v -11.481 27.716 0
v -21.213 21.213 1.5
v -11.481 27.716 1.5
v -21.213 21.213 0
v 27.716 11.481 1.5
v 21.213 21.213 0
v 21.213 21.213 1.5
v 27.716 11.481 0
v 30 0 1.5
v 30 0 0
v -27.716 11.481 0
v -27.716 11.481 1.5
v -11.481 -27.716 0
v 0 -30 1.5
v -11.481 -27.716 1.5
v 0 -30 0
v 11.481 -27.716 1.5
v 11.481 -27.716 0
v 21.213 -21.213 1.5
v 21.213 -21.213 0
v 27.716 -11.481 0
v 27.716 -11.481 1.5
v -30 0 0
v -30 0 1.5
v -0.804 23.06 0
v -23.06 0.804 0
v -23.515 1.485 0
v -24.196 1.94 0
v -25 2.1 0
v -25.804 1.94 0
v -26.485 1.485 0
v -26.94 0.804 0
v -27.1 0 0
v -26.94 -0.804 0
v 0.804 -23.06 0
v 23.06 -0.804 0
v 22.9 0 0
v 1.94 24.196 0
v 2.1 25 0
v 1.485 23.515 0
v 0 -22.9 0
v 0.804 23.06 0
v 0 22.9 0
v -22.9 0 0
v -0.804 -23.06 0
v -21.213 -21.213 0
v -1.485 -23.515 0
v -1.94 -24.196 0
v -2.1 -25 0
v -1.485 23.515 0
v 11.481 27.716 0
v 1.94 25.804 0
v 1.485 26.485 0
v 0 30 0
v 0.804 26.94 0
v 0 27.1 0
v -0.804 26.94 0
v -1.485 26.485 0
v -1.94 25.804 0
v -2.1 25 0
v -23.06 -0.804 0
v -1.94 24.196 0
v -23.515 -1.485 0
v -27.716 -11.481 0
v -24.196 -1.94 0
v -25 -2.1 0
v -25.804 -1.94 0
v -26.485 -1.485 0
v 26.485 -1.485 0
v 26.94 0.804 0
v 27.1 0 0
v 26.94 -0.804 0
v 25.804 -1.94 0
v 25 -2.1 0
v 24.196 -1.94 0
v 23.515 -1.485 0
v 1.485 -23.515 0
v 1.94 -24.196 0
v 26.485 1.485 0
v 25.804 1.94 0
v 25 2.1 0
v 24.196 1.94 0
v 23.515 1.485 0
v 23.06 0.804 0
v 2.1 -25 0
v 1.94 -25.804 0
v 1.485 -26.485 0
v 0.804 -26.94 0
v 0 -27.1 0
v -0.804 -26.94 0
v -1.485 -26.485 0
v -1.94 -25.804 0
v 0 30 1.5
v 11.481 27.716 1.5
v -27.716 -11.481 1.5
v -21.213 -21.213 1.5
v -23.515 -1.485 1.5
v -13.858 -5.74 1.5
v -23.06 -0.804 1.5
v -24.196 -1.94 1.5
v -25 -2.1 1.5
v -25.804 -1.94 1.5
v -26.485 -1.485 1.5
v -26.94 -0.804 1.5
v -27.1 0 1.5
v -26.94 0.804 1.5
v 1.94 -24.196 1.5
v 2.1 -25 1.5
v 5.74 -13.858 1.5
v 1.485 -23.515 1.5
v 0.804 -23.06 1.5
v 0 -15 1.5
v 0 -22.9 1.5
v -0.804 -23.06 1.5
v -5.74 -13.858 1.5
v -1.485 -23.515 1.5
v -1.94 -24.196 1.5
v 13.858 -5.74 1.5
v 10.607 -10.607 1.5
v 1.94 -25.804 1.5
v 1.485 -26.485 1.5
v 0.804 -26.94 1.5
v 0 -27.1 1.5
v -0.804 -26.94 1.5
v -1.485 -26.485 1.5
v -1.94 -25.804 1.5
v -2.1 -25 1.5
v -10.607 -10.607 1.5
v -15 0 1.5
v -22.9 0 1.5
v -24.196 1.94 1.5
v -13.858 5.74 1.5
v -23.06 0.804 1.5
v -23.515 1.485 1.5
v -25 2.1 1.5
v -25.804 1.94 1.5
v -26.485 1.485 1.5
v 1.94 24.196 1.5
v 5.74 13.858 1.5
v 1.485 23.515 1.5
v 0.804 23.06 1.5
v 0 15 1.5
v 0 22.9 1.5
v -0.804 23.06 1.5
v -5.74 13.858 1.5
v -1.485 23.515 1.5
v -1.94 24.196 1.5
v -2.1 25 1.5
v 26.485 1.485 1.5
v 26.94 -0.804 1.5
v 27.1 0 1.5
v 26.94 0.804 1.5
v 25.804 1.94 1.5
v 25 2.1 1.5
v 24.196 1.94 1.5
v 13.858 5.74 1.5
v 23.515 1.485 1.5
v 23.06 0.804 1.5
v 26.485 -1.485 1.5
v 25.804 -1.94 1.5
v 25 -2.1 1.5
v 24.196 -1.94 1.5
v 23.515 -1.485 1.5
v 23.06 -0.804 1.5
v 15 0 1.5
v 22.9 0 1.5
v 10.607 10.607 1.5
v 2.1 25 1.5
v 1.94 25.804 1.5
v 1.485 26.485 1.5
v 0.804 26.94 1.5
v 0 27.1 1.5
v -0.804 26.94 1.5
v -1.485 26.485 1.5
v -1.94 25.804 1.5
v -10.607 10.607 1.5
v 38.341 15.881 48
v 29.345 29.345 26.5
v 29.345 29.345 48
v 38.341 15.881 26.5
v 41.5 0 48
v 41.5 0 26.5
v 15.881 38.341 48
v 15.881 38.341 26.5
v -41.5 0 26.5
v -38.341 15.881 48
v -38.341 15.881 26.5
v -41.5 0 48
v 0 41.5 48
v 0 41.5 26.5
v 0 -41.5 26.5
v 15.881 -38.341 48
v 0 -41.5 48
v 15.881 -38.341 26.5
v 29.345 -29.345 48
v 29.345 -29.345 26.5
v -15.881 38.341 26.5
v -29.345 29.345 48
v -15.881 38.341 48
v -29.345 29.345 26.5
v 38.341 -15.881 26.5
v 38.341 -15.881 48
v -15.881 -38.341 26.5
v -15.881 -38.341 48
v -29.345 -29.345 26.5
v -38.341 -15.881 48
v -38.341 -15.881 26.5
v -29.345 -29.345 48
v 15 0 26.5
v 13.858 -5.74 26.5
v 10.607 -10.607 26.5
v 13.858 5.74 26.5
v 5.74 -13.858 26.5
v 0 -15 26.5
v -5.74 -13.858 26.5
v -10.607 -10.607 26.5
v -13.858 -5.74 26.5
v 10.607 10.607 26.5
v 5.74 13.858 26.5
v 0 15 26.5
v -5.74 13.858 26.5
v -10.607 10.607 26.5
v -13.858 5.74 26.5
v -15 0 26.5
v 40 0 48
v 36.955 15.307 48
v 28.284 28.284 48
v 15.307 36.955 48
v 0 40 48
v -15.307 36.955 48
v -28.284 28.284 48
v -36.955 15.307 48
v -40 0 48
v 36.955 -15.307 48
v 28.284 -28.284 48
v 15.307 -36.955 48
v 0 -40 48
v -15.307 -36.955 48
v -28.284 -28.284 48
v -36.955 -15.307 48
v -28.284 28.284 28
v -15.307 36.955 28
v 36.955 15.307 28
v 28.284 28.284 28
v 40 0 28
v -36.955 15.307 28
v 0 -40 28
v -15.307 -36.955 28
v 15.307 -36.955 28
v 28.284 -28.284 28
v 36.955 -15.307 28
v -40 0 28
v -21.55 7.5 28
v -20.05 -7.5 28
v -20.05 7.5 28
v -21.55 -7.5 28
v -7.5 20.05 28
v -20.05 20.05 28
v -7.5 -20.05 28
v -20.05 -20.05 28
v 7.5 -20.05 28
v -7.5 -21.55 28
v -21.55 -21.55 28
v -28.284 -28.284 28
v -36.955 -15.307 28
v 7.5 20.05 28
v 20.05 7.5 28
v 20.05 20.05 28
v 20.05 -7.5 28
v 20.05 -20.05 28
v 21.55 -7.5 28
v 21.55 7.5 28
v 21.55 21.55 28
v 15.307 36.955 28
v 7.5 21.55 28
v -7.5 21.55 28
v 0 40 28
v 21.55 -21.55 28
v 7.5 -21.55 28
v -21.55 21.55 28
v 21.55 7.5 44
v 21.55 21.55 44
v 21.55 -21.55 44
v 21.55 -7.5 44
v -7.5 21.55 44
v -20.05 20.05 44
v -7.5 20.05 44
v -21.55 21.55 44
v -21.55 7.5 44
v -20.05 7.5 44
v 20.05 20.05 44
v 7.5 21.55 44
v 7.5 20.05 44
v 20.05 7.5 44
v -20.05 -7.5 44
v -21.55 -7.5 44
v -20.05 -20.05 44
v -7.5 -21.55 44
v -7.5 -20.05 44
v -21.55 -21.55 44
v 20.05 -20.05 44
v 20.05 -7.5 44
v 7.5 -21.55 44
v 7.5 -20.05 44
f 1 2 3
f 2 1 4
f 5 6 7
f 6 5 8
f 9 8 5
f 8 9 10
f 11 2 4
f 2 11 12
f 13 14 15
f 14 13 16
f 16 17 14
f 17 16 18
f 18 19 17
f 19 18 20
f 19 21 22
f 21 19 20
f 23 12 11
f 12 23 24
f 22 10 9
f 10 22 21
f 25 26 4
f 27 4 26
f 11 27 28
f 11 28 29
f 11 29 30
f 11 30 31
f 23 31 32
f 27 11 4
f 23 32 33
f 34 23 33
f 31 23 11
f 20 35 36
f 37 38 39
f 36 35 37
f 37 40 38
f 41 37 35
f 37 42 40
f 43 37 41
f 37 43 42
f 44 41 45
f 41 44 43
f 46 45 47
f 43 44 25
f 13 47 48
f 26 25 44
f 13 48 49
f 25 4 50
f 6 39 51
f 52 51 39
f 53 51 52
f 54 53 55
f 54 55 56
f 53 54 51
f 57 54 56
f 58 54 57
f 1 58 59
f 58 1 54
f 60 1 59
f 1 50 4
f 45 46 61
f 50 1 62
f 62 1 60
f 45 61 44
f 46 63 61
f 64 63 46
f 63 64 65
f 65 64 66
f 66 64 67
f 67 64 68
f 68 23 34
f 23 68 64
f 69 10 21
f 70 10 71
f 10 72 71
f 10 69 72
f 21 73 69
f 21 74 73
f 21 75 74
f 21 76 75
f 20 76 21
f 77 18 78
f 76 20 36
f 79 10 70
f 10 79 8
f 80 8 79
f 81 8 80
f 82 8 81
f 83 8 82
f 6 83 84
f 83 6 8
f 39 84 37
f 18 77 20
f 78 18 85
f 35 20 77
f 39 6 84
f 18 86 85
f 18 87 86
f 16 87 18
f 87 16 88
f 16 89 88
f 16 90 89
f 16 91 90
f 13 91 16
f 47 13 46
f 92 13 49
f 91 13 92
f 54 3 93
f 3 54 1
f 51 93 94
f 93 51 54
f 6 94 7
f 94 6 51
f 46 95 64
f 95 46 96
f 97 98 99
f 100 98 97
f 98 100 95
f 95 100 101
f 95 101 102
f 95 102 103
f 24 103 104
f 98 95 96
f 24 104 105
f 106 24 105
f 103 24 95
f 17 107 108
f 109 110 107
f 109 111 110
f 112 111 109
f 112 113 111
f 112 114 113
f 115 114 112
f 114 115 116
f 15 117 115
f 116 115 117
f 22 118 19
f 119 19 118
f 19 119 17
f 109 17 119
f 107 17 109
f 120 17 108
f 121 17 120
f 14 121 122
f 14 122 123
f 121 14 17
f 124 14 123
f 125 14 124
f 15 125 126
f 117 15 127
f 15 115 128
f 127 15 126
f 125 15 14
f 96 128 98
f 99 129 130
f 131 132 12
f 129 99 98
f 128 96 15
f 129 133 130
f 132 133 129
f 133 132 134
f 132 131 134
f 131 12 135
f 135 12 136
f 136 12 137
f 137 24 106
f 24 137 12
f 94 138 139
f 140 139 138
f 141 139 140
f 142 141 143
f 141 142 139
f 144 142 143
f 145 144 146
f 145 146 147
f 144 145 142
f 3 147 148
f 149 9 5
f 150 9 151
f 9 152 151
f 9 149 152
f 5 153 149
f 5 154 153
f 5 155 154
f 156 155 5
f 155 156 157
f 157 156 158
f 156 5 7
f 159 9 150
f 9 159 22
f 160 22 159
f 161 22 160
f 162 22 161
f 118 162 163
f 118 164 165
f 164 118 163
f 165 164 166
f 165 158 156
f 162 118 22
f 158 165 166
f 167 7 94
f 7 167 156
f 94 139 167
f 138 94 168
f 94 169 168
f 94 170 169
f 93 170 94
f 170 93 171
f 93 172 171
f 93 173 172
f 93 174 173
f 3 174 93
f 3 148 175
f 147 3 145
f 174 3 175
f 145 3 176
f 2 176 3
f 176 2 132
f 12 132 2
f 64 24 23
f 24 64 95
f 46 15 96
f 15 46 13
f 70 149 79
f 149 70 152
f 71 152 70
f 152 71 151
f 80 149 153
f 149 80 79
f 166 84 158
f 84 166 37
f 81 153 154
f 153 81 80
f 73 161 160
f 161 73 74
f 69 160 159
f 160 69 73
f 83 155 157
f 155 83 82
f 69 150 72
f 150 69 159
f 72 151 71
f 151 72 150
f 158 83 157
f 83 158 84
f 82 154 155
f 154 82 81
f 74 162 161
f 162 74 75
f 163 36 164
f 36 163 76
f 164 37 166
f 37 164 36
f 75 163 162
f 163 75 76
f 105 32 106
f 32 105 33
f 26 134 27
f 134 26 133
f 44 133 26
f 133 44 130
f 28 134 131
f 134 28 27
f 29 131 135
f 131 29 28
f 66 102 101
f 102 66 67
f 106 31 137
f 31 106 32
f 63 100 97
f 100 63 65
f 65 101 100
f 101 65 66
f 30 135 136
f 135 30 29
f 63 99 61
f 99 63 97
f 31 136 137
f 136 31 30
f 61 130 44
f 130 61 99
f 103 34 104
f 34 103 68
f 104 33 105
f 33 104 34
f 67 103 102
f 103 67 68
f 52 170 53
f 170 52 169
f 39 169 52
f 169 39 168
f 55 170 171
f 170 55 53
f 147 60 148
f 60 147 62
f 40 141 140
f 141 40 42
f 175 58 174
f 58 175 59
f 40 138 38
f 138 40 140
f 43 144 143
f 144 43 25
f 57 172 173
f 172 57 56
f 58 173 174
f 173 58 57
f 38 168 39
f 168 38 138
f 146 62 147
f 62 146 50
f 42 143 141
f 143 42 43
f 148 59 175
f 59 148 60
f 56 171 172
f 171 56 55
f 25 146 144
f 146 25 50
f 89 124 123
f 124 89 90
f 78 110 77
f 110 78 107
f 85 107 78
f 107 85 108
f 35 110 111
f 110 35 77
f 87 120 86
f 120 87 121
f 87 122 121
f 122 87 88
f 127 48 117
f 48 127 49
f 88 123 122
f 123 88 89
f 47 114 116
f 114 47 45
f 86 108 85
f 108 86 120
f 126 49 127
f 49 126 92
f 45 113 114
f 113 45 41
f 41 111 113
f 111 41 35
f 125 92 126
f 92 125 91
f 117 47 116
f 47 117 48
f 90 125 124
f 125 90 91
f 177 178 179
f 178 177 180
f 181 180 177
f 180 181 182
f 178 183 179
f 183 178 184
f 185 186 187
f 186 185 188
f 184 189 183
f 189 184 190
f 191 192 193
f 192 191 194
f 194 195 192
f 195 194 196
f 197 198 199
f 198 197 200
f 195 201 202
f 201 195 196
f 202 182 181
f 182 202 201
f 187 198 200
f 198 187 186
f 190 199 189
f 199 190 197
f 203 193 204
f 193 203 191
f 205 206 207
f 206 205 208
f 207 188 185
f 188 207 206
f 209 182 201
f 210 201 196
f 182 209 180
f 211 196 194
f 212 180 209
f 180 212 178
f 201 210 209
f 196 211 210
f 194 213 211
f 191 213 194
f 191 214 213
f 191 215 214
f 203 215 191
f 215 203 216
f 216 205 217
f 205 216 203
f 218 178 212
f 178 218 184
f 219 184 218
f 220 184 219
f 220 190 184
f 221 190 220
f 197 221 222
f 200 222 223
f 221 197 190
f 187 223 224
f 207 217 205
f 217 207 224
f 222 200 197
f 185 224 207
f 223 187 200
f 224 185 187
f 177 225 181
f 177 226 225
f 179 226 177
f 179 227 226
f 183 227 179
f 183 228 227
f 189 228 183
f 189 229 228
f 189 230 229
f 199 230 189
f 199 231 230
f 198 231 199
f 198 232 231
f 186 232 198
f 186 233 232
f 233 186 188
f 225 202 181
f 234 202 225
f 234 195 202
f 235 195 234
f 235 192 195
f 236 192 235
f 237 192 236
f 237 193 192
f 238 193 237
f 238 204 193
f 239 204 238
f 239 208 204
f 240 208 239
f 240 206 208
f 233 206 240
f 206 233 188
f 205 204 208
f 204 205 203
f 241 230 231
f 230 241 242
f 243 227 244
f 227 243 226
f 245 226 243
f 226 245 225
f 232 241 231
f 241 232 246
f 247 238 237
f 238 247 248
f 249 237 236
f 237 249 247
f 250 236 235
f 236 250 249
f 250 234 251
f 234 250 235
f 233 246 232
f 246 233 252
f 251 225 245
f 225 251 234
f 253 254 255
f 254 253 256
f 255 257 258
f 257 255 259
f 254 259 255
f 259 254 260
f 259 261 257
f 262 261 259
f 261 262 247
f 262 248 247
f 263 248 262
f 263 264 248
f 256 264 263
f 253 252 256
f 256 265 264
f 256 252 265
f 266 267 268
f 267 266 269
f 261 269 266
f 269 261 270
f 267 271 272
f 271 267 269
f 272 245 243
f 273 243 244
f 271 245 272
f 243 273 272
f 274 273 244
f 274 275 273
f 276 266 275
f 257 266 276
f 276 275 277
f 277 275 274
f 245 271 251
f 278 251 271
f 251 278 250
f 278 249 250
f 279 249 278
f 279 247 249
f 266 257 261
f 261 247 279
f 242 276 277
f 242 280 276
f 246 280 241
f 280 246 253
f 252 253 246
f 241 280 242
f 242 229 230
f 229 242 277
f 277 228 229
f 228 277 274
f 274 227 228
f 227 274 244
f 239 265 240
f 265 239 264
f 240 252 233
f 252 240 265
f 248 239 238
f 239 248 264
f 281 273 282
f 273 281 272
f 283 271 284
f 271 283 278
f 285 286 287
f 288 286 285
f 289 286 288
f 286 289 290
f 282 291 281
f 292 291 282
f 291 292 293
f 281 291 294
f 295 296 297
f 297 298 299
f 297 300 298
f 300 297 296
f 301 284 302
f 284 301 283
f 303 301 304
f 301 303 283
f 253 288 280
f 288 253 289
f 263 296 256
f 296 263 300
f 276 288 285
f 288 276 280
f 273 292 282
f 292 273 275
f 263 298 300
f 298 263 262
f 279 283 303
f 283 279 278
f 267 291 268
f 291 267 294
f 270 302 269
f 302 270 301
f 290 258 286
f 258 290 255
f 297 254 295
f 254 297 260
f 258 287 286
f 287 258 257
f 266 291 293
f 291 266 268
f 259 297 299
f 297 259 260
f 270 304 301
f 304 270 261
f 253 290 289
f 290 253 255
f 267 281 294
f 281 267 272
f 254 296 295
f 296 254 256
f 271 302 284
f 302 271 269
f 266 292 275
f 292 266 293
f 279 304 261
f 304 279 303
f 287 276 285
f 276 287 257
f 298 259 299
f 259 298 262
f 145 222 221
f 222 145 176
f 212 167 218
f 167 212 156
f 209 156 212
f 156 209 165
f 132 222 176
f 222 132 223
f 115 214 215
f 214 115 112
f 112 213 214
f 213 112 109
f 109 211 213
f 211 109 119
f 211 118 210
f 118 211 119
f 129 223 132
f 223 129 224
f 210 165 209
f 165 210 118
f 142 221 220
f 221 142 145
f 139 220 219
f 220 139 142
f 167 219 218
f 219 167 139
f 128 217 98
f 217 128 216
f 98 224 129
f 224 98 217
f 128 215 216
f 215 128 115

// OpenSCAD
fn = 16;
bowl_radius = 80 / 2;
base_radius = 60 / 2;
m4_radius = 4.2 / 2;
m4_mount_radius = 50 / 2;
support_radius = 30 / 2;
support_height = 25;
heatsink_square_size= 40.1;
heatsink_height = 10;
sample_height = 10;
bowl_depth = heatsink_height + sample_height;
thickness = 1.5;
rim_height = heatsink_height + sample_height*0.75;
rim_gap = 15;

module sample_rim() {
  difference() {
    cube(size = [heatsink_square_size + thickness*2,
                 heatsink_square_size + thickness*2,
                 rim_height]);
    translate([thickness, thickness, 0])
    cube(size = [heatsink_square_size,
                 heatsink_square_size,
                 rim_height]);
    translate([0, thickness + heatsink_square_size/2 - rim_gap/2, 0])
    cube(size = [heatsink_square_size + thickness*2,
                 rim_gap,
                 rim_height]);
    translate([thickness + heatsink_square_size/2 - rim_gap/2, 0, 0])
    cube(size = [rim_gap,
                 heatsink_square_size + thickness*2,
                 rim_height]);
  }
}

module bowl() {
  union() {
    difference() {
      cylinder(h = bowl_depth + thickness,
               r1 = bowl_radius + thickness,
               r2 = bowl_radius + thickness, $fn=fn);
      translate([0, 0, thickness])
      cylinder(h = bowl_depth,
               r1 = bowl_radius,
               r2 = bowl_radius, $fn=fn);
    }
    translate([
      -(thickness + heatsink_square_size/2),
      -(thickness + heatsink_square_size/2), 0])
    sample_rim();
  }
}

module support() {
  cylinder(h = support_height,
           r1 = support_radius,
           r2 = support_radius, $fn=fn);
}

module base() {
  difference() {
    cylinder(h = thickness,
             r1 = base_radius,
             r2 = base_radius, $fn=fn);
    translate([m4_mount_radius, 0, 0])
    cylinder(h = thickness,
             r1 = m4_radius,
             r2 = m4_radius, $fn=fn);
    translate([-m4_mount_radius, 0, 0])
    cylinder(h = thickness,
             r1 = m4_radius,
             r2 = m4_radius, $fn=fn);
    translate([0, m4_mount_radius, 0])
    cylinder(h = thickness,
             r1 = m4_radius,
             r2 = m4_radius, $fn=fn);
    translate([0, -m4_mount_radius, 0])
    cylinder(h = thickness,
             r1 = m4_radius,
             r2 = m4_radius, $fn=fn);
  }
}

module render() {
  union() {
    base();
    translate([0, 0, thickness])
    support();
    translate([0, 0, thickness + support_height])
    bowl();
    
    
  }
}

echo(version=version());

render();
